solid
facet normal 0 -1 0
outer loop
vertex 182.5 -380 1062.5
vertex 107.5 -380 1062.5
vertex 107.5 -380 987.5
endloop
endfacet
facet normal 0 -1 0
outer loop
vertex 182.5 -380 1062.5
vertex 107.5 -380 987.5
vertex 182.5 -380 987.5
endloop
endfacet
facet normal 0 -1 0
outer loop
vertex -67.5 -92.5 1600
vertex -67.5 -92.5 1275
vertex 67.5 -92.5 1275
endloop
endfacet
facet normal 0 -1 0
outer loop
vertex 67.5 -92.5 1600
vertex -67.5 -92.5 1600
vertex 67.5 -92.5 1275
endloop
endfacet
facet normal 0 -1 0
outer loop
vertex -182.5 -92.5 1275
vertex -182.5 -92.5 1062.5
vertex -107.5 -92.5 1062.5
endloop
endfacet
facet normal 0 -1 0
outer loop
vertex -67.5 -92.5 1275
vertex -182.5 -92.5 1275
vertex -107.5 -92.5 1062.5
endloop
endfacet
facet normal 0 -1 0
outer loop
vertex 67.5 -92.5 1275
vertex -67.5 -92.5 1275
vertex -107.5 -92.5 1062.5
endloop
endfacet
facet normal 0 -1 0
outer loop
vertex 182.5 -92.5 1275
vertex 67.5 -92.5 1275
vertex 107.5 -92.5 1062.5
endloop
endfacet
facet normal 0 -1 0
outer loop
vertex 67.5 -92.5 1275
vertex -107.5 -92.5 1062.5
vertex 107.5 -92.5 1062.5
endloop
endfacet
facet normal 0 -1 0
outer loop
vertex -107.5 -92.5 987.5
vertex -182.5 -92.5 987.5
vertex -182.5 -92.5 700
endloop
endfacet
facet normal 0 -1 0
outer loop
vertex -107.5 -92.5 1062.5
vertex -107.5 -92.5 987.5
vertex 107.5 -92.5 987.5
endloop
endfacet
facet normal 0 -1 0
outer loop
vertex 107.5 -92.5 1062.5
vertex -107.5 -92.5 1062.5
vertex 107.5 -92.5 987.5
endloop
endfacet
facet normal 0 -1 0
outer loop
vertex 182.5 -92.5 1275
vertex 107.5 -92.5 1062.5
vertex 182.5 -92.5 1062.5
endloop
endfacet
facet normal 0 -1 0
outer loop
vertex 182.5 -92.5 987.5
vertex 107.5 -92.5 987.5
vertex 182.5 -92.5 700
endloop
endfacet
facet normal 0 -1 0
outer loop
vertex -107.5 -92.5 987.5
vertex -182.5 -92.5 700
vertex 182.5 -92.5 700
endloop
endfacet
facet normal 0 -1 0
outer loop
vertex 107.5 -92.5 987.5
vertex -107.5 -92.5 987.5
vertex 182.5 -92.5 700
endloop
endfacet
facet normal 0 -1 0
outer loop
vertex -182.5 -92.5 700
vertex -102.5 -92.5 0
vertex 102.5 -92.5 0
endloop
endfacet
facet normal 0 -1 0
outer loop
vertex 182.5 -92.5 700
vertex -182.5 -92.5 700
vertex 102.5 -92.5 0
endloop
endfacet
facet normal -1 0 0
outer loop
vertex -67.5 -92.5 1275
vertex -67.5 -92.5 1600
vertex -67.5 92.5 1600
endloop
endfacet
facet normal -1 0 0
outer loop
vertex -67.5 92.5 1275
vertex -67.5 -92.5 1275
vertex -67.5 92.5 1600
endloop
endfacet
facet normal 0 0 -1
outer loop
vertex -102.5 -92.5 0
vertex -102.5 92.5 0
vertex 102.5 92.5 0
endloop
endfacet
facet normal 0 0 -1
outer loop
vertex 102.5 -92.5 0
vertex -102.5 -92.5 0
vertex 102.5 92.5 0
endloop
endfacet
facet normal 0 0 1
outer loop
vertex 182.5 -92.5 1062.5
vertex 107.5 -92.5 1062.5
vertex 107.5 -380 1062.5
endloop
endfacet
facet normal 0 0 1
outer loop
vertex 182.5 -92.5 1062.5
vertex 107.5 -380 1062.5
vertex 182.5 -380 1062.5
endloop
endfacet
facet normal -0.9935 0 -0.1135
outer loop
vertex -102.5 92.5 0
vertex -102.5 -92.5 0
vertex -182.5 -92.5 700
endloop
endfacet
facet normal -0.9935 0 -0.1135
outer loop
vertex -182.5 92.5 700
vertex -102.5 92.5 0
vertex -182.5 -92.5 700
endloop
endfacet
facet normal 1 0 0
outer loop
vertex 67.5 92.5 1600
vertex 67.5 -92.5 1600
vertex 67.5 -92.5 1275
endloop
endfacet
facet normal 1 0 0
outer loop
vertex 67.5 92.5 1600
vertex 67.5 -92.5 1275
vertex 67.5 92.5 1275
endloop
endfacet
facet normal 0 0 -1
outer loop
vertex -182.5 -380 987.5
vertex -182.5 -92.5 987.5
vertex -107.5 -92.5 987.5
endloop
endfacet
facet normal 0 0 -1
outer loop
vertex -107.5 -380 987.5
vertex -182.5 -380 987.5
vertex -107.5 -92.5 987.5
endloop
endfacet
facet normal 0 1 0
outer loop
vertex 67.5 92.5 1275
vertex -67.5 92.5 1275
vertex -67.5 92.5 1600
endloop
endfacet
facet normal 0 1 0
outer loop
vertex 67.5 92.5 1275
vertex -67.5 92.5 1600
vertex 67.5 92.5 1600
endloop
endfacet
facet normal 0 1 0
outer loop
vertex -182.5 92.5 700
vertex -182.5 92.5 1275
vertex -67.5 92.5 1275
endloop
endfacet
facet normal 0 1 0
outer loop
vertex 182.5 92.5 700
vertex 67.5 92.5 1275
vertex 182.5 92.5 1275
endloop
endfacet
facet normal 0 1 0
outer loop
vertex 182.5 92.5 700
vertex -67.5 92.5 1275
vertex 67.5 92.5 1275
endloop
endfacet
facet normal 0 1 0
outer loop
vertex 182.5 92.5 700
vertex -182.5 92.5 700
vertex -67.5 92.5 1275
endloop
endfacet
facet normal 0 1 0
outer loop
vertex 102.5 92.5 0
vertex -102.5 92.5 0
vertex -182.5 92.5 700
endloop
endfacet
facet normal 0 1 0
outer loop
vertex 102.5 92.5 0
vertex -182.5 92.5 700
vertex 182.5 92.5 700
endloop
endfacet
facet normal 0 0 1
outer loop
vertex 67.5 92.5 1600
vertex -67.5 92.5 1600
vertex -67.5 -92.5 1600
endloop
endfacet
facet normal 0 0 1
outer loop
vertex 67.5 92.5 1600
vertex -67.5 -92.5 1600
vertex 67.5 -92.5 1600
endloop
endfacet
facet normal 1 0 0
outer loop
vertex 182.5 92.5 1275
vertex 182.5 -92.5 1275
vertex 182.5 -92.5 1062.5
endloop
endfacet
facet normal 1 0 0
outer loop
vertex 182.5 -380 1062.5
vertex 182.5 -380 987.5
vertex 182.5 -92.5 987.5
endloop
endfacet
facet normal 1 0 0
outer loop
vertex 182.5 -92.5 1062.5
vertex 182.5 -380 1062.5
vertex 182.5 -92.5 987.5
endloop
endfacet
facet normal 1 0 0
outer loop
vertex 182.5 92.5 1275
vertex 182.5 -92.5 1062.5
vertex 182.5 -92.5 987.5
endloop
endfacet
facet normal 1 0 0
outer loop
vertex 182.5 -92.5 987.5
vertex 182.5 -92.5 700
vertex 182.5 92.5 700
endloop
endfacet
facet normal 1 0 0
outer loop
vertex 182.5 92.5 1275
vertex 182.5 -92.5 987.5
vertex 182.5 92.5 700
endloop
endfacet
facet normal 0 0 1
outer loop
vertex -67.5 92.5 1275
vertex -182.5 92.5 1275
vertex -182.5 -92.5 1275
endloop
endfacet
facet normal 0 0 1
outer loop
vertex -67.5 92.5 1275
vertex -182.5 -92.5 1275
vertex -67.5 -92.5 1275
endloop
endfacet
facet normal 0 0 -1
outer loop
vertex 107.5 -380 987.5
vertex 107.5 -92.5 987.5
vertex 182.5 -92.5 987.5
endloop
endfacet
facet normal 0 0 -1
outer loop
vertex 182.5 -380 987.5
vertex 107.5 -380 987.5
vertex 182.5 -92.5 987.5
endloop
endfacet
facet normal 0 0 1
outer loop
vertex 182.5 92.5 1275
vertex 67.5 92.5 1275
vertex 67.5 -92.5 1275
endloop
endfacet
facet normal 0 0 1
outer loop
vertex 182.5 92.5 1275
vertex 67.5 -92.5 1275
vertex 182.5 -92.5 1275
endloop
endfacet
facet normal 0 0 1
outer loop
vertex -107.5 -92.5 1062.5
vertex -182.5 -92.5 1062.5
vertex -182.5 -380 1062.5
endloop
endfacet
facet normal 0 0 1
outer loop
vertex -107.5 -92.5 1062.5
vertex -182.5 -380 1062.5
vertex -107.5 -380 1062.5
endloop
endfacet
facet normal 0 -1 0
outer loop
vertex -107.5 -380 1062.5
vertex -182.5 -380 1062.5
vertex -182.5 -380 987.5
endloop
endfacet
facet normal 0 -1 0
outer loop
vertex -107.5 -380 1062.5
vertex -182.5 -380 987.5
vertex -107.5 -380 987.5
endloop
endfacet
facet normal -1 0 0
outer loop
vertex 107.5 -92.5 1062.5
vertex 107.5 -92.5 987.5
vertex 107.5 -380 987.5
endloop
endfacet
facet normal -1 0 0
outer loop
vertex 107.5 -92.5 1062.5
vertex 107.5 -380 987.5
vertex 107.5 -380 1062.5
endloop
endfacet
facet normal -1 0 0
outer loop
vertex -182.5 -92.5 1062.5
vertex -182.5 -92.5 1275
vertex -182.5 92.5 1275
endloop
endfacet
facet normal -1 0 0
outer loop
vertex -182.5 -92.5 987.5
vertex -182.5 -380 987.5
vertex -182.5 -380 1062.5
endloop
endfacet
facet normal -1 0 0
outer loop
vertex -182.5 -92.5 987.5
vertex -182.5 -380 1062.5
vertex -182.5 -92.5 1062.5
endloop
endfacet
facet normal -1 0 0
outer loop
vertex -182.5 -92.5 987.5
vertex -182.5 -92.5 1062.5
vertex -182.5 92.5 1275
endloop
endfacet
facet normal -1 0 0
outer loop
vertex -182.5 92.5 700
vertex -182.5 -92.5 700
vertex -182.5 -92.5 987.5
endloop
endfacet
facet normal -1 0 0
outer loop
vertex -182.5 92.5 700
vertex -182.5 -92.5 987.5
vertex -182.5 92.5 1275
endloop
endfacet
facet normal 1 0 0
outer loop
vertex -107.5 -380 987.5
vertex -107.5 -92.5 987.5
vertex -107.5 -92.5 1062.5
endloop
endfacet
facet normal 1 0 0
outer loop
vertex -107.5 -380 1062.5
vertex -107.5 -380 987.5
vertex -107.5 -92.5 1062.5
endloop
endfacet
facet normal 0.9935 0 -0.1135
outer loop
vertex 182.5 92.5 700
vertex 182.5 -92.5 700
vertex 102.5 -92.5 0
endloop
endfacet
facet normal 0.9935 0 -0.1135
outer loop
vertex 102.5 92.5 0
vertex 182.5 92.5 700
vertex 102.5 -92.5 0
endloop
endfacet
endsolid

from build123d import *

# Parameters (mm, degrees)
F0_W     = 365
F0_H     = 185
F1_DEPTH = 1600
F2_W     = 75
F2_H     = 75
F3_DEPTH = 380
F4_W     = 115
F4_H     = 185
F5_DEPTH = 325
F7_DEPTH = 185.001


with BuildPart() as f1:
    # F0 (on Top) → F1 (new body)
    with BuildSketch(Plane.XY):
        Rectangle(F0_W, F0_H)
    extrude(amount=F1_DEPTH)

    # F2 (on Front) → F3 (join)
    with BuildSketch(Plane.XZ):
        with Locations((-145, 1025)):
            Rectangle(F2_W, F2_H)
        with Locations((145, 1025)):
            Rectangle(F2_W, F2_H)
    extrude(amount=F3_DEPTH)

    # F4 (on face) → F5 (cut)
    with BuildSketch(Plane.XY.offset(1600)):
        with Locations((-125, 0)):
            Rectangle(F4_W, F4_H)
        with Locations((125, 0)):
            Rectangle(F4_W, F4_H)
    extrude(amount=-F5_DEPTH, mode=Mode.SUBTRACT)

    # F6 (on face) → F7 (cut, through all)
    with BuildSketch(Plane.XZ.offset(92.5)):
        Polygon((-102.5, 0), (-182.5, 700), (-182.5, 0), align=None)
        Polygon((182.5, 0), (182.5, 700), (102.5, 0), align=None)
    extrude(amount=-F7_DEPTH, mode=Mode.SUBTRACT)


solid = f1.part
